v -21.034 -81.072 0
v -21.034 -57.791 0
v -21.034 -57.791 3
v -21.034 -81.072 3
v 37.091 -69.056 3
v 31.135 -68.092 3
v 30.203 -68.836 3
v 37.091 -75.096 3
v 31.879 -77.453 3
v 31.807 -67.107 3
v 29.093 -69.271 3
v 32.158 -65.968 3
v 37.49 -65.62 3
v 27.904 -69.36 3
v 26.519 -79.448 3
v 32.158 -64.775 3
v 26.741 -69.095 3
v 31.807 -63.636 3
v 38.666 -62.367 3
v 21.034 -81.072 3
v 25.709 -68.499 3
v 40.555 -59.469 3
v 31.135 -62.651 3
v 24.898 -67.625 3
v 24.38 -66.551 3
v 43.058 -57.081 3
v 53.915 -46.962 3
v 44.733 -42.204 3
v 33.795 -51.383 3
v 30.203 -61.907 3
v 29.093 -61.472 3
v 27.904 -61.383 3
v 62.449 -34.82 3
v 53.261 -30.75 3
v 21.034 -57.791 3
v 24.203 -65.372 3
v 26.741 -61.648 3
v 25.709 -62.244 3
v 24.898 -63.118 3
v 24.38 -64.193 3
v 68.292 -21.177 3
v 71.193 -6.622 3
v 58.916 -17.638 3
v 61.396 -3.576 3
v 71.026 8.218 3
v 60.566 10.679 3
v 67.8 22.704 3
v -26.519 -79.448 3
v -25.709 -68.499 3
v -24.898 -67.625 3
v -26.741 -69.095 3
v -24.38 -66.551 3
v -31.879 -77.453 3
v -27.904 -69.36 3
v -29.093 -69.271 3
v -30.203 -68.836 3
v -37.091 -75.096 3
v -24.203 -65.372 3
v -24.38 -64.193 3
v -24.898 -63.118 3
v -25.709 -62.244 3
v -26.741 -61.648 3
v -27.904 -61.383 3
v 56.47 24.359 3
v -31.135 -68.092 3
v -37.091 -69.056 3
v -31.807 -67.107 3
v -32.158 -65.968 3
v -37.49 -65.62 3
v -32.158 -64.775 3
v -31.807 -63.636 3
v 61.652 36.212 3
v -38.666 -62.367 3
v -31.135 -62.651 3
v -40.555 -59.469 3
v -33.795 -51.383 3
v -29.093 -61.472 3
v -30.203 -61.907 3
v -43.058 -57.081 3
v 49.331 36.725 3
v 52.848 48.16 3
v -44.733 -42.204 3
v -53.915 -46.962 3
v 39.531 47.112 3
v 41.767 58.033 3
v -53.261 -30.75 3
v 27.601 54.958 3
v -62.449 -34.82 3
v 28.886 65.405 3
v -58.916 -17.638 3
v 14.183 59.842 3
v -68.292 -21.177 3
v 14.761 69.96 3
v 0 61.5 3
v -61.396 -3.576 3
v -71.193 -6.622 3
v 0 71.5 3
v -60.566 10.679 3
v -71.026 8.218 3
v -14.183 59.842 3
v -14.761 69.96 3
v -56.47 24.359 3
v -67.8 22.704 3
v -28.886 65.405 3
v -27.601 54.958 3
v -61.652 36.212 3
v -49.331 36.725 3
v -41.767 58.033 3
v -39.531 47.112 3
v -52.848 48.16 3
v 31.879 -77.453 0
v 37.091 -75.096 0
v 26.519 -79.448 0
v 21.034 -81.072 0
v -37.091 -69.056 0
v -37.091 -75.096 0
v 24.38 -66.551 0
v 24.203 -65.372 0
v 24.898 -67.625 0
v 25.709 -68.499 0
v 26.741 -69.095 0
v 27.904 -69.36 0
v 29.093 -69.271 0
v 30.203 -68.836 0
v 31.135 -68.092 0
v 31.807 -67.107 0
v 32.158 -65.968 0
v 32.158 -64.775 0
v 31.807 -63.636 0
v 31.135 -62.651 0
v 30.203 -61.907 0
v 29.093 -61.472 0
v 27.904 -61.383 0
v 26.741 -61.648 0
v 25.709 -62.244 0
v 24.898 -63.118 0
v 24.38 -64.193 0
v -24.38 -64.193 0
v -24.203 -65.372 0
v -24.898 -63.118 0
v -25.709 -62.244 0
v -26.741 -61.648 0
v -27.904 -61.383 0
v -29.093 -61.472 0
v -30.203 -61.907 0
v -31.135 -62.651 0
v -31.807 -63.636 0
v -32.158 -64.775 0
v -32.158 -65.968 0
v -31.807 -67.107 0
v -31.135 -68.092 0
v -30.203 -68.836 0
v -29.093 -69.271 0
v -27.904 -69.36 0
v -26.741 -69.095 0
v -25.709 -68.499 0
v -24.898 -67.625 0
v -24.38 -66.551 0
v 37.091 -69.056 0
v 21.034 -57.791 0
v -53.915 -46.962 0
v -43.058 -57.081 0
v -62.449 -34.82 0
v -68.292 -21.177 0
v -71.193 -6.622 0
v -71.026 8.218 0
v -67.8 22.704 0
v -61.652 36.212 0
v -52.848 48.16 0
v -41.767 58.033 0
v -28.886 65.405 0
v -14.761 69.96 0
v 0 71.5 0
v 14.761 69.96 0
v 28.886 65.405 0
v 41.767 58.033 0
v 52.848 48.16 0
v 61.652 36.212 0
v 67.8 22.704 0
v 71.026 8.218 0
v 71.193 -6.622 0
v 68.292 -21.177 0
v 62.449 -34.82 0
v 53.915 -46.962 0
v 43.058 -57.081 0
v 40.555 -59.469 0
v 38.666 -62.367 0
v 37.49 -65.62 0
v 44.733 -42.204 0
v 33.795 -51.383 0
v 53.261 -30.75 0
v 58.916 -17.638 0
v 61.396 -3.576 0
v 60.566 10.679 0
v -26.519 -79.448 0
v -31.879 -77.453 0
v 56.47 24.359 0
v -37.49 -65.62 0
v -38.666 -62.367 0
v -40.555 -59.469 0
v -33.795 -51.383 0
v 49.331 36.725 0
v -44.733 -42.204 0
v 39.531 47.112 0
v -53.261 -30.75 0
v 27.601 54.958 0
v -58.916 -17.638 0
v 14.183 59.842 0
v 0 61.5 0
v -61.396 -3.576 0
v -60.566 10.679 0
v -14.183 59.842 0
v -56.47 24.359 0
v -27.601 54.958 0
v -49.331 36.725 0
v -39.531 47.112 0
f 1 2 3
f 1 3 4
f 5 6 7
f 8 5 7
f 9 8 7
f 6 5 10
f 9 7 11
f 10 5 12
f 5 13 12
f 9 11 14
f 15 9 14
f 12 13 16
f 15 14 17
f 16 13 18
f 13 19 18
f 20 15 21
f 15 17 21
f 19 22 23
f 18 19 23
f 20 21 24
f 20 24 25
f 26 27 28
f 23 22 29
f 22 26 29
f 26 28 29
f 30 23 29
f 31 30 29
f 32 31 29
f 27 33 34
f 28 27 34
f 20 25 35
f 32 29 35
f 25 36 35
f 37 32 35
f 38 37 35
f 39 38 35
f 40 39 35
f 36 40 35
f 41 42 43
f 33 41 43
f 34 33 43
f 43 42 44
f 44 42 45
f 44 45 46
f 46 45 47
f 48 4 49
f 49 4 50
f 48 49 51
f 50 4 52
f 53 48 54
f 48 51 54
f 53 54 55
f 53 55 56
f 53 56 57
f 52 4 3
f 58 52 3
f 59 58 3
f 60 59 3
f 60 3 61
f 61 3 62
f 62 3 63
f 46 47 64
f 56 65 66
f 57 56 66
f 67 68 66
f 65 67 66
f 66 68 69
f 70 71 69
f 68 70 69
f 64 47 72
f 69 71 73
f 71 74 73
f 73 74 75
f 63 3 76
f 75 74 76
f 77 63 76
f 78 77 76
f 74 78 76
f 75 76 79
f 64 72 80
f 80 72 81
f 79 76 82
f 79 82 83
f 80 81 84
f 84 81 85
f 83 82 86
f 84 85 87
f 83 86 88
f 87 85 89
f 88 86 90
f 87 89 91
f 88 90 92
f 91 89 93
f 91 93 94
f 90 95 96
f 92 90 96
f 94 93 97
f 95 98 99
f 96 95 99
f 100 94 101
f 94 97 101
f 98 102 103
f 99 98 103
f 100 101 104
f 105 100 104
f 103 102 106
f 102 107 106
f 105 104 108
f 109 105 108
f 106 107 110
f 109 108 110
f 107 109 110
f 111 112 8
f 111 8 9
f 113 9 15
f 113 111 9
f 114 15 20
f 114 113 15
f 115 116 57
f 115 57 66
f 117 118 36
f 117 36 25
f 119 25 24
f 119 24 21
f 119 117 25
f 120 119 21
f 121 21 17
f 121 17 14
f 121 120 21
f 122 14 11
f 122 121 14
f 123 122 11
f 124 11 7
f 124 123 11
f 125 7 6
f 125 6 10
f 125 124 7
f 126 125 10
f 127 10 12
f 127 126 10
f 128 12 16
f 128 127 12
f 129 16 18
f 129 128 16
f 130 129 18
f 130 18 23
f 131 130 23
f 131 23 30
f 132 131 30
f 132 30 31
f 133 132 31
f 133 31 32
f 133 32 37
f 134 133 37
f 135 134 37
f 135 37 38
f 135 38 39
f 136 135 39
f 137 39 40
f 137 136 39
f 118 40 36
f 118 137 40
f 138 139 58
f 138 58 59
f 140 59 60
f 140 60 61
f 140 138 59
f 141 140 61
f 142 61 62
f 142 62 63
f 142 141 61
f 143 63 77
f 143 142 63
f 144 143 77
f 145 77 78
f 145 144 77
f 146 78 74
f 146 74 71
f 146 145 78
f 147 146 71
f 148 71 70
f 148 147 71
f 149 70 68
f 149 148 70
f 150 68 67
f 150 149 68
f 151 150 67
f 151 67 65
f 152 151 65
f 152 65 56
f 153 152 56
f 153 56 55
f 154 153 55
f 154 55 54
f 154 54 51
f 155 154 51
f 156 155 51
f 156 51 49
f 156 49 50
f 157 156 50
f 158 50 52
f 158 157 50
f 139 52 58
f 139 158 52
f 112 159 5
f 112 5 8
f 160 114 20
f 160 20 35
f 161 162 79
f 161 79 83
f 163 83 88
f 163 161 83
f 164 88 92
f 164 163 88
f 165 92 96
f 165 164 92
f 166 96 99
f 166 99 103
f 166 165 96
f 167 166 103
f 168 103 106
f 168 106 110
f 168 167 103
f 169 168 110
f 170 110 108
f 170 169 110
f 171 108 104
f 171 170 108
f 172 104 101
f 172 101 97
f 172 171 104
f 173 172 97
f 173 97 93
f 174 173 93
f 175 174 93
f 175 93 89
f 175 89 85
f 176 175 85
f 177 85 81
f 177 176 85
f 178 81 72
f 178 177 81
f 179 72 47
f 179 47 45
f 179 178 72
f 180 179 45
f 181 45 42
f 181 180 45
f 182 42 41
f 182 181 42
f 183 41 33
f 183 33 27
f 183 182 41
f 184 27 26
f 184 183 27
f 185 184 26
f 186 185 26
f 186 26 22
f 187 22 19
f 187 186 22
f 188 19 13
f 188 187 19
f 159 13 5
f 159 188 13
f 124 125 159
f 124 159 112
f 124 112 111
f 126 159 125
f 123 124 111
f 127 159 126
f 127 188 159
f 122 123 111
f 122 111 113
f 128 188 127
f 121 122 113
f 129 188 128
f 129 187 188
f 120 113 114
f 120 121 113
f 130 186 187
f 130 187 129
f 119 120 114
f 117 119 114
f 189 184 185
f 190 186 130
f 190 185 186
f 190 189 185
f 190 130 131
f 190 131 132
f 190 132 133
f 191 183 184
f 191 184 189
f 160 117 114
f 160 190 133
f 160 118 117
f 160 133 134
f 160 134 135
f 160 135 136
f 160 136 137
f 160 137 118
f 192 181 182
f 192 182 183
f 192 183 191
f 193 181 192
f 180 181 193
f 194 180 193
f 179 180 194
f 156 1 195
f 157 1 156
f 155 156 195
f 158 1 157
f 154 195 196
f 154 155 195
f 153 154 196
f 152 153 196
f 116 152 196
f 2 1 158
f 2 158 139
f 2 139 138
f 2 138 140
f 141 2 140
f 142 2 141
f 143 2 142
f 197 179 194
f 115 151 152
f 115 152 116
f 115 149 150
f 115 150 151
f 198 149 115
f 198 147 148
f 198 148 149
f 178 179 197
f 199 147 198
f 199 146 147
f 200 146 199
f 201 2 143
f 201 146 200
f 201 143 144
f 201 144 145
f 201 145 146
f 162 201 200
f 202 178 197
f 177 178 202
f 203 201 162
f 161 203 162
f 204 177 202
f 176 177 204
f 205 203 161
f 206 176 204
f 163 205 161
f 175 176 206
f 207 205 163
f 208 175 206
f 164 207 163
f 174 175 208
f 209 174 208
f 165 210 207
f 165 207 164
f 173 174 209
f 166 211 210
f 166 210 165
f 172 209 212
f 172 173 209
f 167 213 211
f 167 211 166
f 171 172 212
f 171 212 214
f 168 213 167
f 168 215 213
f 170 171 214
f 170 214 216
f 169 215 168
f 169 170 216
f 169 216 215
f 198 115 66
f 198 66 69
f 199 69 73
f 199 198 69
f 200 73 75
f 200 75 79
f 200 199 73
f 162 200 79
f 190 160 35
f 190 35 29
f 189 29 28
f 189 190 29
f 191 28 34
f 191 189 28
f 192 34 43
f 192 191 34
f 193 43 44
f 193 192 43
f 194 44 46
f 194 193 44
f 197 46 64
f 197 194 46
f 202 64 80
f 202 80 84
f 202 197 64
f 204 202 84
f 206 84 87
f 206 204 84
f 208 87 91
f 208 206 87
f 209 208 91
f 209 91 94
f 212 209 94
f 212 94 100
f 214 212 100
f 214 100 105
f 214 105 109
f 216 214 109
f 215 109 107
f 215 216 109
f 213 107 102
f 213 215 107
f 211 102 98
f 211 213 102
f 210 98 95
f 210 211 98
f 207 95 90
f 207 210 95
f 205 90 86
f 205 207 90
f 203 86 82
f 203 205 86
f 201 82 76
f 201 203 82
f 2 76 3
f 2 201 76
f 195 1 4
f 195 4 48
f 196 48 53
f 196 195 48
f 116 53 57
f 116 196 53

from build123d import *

# Parameters (mm, degrees)
ESQUISSE1_R        = 4
BOSS_EXTRU_1_DEPTH = 3


with BuildPart() as part:
    # Esquisse1 → Boss.-Extru.1 (new body)
    with BuildSketch(Plane.XY):
        with BuildLine():
            Line((-21.034238815, -57.791096178), (-21.034238815, -81.072422518))
            ThreePointArc((-21.034238815, -81.072422518), (-29.215924567, -78.495902105), (-37.091180109, -75.096080148))
            Line((-37.091180109, -75.096080148), (-37.091180109, -69.056201422))
            ThreePointArc((-37.091180109, -69.056201422), (-38.665509003, -62.366556039), (-43.058027489, -57.081137592))
            ThreePointArc((-43.058027489, -57.081137592), (0, 71.5), (43.058027489, -57.081137592))
            ThreePointArc((43.058027489, -57.081137592), (38.665509003, -62.366556039), (37.091180109, -69.056201422))
            Line((37.091180109, -69.056201422), (37.091180109, -75.096080148))
            ThreePointArc((37.091180109, -75.096080148), (29.215924567, -78.495902105), (21.034238815, -81.072422518))
            Line((21.034238815, -81.072422518), (21.034238815, -57.791096178))
            ThreePointArc((21.034238815, -57.791096178), (0, 61.5), (-21.034238815, -57.791096178))
        make_face()
        with Locations((-28.202703448, -65.371545378)):
            Circle(ESQUISSE1_R, mode=Mode.SUBTRACT)
        with Locations(Location((28.202703448, -65.371545378, 0), (0, 0, 180))):
            Circle(ESQUISSE1_R, mode=Mode.SUBTRACT)
    extrude(amount=BOSS_EXTRU_1_DEPTH)


solid = part.part
